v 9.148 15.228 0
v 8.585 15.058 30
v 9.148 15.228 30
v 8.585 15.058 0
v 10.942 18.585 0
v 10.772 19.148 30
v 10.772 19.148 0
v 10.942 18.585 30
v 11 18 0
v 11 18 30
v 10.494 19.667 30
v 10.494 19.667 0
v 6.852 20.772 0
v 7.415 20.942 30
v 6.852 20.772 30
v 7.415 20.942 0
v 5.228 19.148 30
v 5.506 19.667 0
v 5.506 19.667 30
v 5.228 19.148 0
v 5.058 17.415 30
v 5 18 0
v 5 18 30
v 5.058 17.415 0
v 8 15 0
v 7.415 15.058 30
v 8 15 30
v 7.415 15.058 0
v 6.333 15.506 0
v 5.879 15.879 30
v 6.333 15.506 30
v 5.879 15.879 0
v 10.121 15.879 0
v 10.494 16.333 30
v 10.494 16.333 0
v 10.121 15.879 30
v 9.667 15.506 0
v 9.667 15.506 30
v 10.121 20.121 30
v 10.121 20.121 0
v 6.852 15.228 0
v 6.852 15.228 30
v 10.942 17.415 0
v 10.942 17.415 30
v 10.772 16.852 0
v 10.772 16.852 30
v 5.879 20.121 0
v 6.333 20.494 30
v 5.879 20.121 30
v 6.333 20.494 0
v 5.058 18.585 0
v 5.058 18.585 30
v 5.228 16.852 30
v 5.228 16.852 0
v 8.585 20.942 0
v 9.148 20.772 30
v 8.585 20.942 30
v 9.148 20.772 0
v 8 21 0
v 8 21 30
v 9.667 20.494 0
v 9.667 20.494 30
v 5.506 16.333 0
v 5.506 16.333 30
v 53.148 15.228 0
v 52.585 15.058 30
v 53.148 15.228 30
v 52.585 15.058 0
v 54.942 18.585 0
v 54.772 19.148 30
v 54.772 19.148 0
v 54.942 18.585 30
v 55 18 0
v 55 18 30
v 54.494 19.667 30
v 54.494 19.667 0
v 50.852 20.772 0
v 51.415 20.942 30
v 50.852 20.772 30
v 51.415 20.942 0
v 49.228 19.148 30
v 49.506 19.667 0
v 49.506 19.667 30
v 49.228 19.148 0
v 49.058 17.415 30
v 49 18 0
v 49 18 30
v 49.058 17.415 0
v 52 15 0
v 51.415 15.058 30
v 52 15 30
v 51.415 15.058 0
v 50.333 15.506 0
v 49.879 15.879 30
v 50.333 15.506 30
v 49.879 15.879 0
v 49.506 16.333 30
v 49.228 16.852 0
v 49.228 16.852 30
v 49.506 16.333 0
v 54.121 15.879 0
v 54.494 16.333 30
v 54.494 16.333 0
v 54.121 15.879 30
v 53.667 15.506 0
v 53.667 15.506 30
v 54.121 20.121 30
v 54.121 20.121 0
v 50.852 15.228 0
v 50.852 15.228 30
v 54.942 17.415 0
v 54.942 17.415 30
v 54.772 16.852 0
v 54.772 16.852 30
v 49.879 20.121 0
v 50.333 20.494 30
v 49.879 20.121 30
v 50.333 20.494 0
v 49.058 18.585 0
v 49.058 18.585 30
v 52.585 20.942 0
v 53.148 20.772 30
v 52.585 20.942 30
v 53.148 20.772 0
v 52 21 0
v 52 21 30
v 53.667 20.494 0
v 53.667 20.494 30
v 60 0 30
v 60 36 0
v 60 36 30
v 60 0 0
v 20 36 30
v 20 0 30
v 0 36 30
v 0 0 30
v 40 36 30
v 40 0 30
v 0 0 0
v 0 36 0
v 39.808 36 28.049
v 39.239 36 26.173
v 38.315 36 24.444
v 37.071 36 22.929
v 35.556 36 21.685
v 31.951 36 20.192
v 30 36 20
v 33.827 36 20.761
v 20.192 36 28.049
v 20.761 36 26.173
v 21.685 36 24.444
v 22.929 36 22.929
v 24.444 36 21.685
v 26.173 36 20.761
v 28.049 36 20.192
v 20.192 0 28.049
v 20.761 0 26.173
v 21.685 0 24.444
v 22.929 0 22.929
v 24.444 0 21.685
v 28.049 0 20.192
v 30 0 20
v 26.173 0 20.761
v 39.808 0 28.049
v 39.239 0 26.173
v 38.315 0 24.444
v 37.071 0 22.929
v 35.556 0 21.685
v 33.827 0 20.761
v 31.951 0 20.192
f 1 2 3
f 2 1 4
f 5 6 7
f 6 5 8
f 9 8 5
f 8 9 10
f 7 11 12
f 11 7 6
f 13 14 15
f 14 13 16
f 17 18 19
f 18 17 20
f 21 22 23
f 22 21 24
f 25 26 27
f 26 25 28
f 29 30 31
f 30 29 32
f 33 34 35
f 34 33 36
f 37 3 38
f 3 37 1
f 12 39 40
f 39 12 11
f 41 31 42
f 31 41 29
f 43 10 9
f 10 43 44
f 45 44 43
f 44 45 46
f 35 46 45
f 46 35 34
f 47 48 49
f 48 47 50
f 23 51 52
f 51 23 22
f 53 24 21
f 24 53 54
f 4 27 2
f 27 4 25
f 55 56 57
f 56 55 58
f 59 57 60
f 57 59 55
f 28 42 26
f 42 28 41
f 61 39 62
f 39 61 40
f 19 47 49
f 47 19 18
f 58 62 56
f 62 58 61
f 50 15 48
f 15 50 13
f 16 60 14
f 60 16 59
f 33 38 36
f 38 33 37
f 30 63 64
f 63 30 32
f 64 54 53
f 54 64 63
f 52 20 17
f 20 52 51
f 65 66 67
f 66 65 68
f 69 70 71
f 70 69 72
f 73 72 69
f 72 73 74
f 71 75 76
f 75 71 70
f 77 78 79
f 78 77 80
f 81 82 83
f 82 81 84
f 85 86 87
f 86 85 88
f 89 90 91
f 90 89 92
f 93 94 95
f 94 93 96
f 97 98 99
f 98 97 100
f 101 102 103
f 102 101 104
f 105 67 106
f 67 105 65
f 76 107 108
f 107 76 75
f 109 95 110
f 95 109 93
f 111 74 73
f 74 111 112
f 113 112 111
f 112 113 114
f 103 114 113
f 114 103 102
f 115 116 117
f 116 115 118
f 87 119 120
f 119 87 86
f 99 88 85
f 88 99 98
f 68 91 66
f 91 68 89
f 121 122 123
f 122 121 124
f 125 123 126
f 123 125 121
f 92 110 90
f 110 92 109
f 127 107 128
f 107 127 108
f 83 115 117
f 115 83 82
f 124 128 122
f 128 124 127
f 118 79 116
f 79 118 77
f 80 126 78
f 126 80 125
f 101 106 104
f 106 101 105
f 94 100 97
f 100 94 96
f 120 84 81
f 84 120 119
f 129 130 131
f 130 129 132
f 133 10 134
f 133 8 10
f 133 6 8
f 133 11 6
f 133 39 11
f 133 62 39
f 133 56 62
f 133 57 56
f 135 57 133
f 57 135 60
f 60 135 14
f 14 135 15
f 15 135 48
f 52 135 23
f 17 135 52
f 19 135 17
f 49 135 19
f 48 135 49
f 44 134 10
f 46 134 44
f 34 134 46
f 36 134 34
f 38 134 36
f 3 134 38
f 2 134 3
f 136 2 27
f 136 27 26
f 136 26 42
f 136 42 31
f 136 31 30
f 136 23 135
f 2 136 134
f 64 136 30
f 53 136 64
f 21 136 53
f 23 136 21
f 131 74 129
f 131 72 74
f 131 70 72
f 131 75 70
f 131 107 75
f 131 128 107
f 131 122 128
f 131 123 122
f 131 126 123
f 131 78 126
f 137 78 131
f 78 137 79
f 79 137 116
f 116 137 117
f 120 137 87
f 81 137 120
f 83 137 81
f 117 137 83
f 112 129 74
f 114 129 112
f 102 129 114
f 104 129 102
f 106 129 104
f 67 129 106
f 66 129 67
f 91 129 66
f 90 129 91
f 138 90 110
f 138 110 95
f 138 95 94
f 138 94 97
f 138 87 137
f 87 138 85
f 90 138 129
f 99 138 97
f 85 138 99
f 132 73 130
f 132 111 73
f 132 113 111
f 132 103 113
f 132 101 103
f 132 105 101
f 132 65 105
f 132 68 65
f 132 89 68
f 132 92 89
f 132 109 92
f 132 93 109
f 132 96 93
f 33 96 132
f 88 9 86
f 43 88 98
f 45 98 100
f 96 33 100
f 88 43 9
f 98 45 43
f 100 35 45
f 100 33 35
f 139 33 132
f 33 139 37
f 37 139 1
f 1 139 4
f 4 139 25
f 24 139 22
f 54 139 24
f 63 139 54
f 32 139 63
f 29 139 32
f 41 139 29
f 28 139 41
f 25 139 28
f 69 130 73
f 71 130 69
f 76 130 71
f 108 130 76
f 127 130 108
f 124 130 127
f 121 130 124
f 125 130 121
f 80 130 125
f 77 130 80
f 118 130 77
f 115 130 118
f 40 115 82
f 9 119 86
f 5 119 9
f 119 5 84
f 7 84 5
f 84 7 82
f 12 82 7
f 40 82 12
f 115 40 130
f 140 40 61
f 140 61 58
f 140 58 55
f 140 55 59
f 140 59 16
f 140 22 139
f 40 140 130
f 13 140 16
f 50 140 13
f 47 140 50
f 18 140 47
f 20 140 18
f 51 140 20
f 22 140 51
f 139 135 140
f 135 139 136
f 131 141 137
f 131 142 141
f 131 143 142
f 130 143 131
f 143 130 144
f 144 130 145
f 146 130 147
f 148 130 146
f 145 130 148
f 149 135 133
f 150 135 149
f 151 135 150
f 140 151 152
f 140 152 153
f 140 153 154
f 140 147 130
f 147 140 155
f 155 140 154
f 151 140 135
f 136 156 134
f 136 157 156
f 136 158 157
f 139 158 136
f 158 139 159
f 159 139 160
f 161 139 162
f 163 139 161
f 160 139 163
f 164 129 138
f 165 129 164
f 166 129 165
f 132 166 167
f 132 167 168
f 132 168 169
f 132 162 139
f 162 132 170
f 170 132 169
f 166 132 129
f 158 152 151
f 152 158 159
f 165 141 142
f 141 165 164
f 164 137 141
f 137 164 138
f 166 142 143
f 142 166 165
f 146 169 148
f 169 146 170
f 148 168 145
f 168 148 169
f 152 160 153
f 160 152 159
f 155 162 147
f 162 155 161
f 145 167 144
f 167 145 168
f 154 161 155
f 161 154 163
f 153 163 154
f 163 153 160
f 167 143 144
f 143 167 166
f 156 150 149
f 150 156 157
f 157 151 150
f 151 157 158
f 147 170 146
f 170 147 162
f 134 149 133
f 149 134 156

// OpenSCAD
$fn = 32;

// ----------------------------------------------------------------------
// Saddle clamp: plain shaft clamp
// ----------------------------------------------------------------------

// --- parameters (mm) ---
blk_l = 60;               // block length, X
blk_w = 36;               // block width, Y
blk_h = 30;               // block height
clamp_r = 10;             // shaft groove radius
hole_r = 3;               // bolt hole radius
hole_m = 8;               // bolt hole margin from the ends

saw_depth = clamp_r + 3;  // saw kerf depth

difference() {
  cube([blk_l, blk_w, blk_h]);
  translate([blk_l / 2, -1, blk_h])
    rotate([-90, 0, 0])
      cylinder(h = blk_w + 2, r = clamp_r);
  for (sx = [0, 1])
    translate([sx ? blk_l - hole_m : hole_m, blk_w / 2, -1])
      cylinder(r = hole_r, h = blk_h + 2);
}
